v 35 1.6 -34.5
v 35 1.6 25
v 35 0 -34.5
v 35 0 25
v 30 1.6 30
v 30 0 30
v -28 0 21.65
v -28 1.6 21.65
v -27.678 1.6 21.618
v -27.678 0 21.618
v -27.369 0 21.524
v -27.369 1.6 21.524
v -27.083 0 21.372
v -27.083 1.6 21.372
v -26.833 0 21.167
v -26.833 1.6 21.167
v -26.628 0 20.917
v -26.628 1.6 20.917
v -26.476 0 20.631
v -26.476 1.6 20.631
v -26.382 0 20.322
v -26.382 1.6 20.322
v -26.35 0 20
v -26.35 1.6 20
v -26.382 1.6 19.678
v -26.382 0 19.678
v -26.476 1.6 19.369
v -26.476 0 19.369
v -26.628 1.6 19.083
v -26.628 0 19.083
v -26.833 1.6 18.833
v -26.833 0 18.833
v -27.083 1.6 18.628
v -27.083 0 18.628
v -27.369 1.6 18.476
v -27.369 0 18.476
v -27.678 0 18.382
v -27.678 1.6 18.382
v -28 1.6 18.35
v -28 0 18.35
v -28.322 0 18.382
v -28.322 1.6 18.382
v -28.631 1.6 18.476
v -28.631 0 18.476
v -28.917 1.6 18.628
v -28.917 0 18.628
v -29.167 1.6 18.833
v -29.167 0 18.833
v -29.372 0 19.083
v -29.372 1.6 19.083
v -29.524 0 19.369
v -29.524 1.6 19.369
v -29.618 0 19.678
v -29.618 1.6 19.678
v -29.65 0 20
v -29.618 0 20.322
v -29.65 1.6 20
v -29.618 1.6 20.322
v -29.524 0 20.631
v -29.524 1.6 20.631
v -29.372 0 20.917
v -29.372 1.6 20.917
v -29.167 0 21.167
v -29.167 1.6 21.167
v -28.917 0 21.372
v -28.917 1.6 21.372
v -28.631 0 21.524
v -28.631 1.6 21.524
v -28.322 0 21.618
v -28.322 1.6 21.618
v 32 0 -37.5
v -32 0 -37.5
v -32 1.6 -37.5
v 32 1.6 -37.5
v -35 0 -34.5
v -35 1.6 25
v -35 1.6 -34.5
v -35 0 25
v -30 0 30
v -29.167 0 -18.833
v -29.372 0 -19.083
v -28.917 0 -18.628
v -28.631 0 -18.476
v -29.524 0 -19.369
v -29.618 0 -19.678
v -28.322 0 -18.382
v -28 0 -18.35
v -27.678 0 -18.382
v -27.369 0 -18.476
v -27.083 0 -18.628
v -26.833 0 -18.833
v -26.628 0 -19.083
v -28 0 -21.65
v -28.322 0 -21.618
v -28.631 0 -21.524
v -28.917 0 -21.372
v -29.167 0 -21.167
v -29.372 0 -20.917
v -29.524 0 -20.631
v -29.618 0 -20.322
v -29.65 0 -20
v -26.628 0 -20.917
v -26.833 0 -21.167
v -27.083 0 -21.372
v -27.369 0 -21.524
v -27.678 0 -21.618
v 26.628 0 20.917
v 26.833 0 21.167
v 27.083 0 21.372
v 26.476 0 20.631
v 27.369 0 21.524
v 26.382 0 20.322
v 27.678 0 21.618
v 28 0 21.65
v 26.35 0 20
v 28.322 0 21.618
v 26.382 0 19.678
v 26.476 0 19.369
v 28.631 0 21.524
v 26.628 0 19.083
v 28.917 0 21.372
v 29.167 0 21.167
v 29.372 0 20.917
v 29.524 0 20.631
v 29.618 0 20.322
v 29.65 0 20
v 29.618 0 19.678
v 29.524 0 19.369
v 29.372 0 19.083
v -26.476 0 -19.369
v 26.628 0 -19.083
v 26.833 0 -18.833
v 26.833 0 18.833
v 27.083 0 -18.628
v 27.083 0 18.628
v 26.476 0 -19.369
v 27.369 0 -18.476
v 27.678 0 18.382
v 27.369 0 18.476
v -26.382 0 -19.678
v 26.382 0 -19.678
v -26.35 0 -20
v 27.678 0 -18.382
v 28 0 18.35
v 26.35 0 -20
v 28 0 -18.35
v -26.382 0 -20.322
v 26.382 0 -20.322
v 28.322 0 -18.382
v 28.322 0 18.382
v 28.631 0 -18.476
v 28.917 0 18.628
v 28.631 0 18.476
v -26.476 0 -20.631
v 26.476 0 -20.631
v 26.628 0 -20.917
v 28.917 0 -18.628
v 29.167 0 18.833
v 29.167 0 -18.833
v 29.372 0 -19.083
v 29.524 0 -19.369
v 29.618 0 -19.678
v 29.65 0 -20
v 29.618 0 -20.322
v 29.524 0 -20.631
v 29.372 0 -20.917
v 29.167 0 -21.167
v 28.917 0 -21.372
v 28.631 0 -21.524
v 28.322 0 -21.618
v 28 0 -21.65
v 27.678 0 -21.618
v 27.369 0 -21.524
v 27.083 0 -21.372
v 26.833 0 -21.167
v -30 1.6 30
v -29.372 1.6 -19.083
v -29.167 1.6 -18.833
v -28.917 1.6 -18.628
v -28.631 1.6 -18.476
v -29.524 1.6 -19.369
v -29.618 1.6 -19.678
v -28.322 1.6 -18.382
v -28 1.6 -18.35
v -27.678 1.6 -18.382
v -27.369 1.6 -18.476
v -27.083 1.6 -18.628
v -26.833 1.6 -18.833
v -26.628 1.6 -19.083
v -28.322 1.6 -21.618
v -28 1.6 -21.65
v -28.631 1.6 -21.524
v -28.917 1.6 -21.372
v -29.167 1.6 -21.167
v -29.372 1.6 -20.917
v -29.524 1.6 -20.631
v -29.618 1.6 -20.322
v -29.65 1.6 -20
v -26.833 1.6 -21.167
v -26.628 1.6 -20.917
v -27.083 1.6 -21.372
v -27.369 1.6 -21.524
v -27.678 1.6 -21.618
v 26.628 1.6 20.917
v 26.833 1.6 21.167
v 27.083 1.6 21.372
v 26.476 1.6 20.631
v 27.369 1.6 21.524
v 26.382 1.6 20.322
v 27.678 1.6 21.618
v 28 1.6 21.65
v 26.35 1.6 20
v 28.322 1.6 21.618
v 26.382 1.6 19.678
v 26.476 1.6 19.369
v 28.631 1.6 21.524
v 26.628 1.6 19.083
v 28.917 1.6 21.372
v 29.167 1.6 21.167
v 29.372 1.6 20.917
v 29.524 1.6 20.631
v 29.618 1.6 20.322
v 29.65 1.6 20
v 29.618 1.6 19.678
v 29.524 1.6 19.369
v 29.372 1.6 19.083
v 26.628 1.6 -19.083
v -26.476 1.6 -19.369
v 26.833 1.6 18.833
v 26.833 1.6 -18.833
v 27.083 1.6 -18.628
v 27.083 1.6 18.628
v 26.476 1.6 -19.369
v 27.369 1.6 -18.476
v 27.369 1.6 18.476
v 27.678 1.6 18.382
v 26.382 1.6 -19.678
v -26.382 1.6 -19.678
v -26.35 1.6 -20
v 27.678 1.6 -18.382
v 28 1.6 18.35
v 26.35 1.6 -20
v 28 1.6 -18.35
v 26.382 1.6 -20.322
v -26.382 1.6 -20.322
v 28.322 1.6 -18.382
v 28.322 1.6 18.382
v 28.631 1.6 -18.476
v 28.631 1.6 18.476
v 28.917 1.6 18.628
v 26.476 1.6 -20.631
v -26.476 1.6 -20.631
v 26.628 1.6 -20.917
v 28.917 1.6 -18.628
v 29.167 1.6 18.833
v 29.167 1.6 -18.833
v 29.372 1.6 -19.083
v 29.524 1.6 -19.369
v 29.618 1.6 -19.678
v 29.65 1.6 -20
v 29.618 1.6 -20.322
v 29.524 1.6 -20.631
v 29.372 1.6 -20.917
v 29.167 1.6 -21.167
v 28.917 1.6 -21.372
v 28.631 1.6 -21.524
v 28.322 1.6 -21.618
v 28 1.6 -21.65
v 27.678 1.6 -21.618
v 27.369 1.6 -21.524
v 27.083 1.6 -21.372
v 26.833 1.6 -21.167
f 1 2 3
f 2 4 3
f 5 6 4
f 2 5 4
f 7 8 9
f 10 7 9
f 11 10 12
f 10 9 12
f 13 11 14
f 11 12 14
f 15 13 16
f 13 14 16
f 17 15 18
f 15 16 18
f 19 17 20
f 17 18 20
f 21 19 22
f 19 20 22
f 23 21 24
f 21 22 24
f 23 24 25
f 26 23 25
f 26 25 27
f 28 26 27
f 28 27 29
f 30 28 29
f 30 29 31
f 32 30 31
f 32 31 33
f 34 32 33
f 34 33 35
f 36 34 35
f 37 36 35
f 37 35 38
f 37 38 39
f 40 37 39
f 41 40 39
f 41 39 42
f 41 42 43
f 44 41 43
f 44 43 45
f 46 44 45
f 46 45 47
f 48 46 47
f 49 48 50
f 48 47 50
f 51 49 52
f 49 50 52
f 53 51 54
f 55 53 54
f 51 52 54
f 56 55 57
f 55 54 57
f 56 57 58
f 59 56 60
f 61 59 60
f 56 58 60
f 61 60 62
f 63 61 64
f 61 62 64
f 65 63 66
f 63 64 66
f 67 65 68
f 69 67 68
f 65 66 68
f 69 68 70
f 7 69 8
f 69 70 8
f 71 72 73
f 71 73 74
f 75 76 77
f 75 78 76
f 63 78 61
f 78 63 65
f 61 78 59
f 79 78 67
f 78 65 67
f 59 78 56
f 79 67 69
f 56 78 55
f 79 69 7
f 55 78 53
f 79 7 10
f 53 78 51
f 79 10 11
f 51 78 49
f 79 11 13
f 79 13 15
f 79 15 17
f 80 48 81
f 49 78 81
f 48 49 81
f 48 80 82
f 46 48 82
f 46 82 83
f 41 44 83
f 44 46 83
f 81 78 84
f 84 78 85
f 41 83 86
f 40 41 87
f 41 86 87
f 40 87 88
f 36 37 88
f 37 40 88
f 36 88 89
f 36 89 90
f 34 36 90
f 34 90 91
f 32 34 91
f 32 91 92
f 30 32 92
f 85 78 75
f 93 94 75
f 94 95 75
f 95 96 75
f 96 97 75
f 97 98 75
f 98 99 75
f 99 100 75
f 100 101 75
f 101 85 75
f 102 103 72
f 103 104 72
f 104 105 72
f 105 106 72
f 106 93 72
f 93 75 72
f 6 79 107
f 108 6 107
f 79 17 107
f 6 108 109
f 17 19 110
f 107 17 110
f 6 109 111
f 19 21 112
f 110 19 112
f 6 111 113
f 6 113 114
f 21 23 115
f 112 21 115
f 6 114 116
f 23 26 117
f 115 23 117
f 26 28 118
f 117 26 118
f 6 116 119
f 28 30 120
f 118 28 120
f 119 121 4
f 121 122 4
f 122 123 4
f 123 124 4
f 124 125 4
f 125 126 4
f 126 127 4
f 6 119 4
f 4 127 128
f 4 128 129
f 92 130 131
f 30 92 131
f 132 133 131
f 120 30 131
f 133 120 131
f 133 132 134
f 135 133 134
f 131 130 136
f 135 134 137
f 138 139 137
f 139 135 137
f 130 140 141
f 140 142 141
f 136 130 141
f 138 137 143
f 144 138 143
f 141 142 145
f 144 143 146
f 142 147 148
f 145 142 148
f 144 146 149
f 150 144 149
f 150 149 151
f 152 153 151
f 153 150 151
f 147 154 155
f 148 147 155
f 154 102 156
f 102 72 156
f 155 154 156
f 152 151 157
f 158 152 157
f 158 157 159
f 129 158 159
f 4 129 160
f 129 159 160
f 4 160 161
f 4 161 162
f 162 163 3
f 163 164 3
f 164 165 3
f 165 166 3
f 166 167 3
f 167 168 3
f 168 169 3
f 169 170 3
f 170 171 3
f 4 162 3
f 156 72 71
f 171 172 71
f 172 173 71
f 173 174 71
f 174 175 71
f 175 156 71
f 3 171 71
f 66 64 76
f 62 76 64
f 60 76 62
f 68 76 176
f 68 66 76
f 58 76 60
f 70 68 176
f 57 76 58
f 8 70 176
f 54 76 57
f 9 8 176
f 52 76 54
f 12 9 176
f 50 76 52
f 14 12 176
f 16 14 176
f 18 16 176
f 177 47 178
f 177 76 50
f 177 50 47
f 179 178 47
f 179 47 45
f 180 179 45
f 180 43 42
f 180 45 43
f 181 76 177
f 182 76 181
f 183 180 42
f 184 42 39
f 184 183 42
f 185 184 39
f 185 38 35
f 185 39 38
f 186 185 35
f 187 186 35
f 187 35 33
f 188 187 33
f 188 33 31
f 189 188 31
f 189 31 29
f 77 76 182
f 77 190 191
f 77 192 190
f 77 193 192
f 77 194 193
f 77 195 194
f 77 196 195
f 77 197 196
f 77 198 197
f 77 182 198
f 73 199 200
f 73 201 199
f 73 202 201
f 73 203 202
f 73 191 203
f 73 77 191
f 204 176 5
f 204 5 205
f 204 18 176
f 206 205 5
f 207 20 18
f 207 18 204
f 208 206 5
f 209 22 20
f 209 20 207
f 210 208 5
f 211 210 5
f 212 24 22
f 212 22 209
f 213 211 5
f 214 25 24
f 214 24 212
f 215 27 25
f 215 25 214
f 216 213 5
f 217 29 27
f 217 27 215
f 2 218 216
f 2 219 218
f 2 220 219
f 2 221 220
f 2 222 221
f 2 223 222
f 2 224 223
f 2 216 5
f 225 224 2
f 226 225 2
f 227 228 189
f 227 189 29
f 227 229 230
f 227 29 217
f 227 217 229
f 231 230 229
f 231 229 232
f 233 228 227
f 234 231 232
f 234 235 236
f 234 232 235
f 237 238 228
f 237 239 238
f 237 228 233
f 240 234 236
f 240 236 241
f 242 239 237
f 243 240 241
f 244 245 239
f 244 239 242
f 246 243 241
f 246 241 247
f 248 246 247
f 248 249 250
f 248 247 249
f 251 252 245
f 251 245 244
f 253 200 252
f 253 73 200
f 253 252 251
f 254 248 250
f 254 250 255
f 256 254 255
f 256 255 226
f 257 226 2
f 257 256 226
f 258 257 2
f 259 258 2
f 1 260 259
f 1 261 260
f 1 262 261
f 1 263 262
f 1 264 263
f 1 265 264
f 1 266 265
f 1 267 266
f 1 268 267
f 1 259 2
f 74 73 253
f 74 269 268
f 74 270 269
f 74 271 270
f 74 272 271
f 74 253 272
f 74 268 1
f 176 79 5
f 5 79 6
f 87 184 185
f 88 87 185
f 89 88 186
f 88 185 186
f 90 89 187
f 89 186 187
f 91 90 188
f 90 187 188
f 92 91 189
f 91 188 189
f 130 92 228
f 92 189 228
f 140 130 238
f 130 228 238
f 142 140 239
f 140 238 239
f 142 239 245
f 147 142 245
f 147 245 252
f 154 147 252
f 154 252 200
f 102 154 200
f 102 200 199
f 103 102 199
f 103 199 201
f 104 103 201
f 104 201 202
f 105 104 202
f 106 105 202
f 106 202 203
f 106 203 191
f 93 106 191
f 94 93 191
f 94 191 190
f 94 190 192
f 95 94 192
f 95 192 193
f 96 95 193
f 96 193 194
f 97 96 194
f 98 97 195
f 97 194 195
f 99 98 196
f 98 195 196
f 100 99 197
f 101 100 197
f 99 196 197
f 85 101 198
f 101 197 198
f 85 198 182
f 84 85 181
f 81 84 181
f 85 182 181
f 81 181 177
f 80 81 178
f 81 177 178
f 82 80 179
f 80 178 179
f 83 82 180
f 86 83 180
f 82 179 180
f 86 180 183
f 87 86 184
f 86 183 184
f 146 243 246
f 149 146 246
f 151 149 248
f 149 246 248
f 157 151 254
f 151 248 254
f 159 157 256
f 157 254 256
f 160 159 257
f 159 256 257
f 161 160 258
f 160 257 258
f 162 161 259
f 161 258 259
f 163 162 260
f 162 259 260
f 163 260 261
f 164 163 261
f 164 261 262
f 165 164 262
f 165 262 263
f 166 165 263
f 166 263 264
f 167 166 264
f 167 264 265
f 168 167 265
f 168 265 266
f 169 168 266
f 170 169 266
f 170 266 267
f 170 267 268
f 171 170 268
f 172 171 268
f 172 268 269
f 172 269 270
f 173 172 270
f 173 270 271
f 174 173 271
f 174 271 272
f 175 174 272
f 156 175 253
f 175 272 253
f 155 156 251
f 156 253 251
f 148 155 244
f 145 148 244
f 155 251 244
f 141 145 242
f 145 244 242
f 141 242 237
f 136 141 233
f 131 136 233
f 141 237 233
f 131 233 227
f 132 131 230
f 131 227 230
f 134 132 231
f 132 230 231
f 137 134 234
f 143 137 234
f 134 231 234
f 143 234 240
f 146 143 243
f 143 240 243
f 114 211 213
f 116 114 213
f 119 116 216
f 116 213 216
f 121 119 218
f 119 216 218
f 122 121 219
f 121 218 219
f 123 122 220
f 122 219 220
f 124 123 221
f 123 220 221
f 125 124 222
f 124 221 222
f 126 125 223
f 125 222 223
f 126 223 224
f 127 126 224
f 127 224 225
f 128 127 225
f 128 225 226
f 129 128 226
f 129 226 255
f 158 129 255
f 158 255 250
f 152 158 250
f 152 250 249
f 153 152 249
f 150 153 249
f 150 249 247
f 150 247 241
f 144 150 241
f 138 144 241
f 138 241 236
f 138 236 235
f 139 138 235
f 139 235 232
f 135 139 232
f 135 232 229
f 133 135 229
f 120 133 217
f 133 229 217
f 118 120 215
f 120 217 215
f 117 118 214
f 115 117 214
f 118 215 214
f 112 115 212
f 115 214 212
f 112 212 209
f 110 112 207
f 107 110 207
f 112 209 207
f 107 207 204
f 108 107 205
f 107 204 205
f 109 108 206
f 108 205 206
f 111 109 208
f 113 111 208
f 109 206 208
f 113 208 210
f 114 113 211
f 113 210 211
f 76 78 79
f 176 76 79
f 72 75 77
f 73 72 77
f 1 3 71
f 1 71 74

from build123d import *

# Parameters (mm, degrees)
SKETCH_1_W          = 70
SKETCH_1_H          = 50
EXTRUDE_1_DEPTH     = 1.6
CUT_EXTRUDE_1_REACH = 45.041
SKETCH_2_R          = 1.65
SKETCH_3_W          = 70
SKETCH_3_H          = 12.5
EXTRUDE_2_DEPTH     = 1.6
CHAMFER_1_SIZE      = 3


with BuildPart() as part:
    # 草图1 → 凸台-拉伸1 (new body)
    with BuildSketch(Plane(origin=(0, 0, 0), x_dir=(1, 0, 0), z_dir=(0, 1, 0))):
        Rectangle(SKETCH_1_W, SKETCH_1_H)
    extrude(amount=EXTRUDE_1_DEPTH)

    # 草图2 → 切除-拉伸1 (cut, up to next)
    with BuildSketch(Plane(origin=(0, 1.6, 0), x_dir=(1, 0, 0), z_dir=(0, 1, 0)), mode=Mode.PRIVATE) as cut_extrude_1_sk1:
        with Locations(Location((-28, 20, 0), (0, 0, 270))):
            Circle(SKETCH_2_R)
    cut_extrude_1_tool1 = extrude(cut_extrude_1_sk1.sketch, amount=-CUT_EXTRUDE_1_REACH, mode=Mode.PRIVATE) & part.part
    # 草图2 → 切除-拉伸1 (cut, up to next)
    with BuildSketch(Plane(origin=(0, 1.6, 0), x_dir=(1, 0, 0), z_dir=(0, 1, 0)), mode=Mode.PRIVATE) as cut_extrude_1_sk2:
        with Locations(Location((-28, -20, 0), (0, 0, 270))):
            Circle(SKETCH_2_R)
    cut_extrude_1_tool2 = extrude(cut_extrude_1_sk2.sketch, amount=-CUT_EXTRUDE_1_REACH, mode=Mode.PRIVATE) & part.part
    # 草图2 → 切除-拉伸1 (cut, up to next)
    with BuildSketch(Plane(origin=(0, 1.6, 0), x_dir=(1, 0, 0), z_dir=(0, 1, 0)), mode=Mode.PRIVATE) as cut_extrude_1_sk3:
        with Locations(Location((28, -20, 0), (0, 0, 270))):
            Circle(SKETCH_2_R)
    cut_extrude_1_tool3 = extrude(cut_extrude_1_sk3.sketch, amount=-CUT_EXTRUDE_1_REACH, mode=Mode.PRIVATE) & part.part
    # 草图2 → 切除-拉伸1 (cut, up to next)
    with BuildSketch(Plane(origin=(0, 1.6, 0), x_dir=(1, 0, 0), z_dir=(0, 1, 0)), mode=Mode.PRIVATE) as cut_extrude_1_sk4:
        with Locations(Location((28, 20, 0), (0, 0, 270))):
            Circle(SKETCH_2_R)
    cut_extrude_1_tool4 = extrude(cut_extrude_1_sk4.sketch, amount=-CUT_EXTRUDE_1_REACH, mode=Mode.PRIVATE) & part.part
    add(cut_extrude_1_tool1.solids().sort_by_distance((-28, 1.6, -20))[0], mode=Mode.SUBTRACT)
    add(cut_extrude_1_tool2.solids().sort_by_distance((-28, 1.6, 20))[0], mode=Mode.SUBTRACT)
    add(cut_extrude_1_tool3.solids().sort_by_distance((28, 1.6, 20))[0], mode=Mode.SUBTRACT)
    add(cut_extrude_1_tool4.solids().sort_by_distance((28, 1.6, -20))[0], mode=Mode.SUBTRACT)

    # 草图3 → 凸台-拉伸2 (add)
    with BuildSketch(Plane(origin=(0, 0, 0), x_dir=(1, 0, 0), z_dir=(0, 1, 0))):
        Polygon((-35, -25), (-30, -30), (30, -30), (35, -25), align=None)
        with Locations((0, 31.25)):
            Rectangle(SKETCH_3_W, SKETCH_3_H)
    extrude(amount=EXTRUDE_2_DEPTH)

    # 倒角1
    chamfer_1_edges = [part.edges().sort_by_distance(p)[0] for p in [
        (35, 0.8, -37.5),
        (-35, 0.8, -37.5),
    ]]
    chamfer(chamfer_1_edges, length=CHAMFER_1_SIZE)


solid = part.part
